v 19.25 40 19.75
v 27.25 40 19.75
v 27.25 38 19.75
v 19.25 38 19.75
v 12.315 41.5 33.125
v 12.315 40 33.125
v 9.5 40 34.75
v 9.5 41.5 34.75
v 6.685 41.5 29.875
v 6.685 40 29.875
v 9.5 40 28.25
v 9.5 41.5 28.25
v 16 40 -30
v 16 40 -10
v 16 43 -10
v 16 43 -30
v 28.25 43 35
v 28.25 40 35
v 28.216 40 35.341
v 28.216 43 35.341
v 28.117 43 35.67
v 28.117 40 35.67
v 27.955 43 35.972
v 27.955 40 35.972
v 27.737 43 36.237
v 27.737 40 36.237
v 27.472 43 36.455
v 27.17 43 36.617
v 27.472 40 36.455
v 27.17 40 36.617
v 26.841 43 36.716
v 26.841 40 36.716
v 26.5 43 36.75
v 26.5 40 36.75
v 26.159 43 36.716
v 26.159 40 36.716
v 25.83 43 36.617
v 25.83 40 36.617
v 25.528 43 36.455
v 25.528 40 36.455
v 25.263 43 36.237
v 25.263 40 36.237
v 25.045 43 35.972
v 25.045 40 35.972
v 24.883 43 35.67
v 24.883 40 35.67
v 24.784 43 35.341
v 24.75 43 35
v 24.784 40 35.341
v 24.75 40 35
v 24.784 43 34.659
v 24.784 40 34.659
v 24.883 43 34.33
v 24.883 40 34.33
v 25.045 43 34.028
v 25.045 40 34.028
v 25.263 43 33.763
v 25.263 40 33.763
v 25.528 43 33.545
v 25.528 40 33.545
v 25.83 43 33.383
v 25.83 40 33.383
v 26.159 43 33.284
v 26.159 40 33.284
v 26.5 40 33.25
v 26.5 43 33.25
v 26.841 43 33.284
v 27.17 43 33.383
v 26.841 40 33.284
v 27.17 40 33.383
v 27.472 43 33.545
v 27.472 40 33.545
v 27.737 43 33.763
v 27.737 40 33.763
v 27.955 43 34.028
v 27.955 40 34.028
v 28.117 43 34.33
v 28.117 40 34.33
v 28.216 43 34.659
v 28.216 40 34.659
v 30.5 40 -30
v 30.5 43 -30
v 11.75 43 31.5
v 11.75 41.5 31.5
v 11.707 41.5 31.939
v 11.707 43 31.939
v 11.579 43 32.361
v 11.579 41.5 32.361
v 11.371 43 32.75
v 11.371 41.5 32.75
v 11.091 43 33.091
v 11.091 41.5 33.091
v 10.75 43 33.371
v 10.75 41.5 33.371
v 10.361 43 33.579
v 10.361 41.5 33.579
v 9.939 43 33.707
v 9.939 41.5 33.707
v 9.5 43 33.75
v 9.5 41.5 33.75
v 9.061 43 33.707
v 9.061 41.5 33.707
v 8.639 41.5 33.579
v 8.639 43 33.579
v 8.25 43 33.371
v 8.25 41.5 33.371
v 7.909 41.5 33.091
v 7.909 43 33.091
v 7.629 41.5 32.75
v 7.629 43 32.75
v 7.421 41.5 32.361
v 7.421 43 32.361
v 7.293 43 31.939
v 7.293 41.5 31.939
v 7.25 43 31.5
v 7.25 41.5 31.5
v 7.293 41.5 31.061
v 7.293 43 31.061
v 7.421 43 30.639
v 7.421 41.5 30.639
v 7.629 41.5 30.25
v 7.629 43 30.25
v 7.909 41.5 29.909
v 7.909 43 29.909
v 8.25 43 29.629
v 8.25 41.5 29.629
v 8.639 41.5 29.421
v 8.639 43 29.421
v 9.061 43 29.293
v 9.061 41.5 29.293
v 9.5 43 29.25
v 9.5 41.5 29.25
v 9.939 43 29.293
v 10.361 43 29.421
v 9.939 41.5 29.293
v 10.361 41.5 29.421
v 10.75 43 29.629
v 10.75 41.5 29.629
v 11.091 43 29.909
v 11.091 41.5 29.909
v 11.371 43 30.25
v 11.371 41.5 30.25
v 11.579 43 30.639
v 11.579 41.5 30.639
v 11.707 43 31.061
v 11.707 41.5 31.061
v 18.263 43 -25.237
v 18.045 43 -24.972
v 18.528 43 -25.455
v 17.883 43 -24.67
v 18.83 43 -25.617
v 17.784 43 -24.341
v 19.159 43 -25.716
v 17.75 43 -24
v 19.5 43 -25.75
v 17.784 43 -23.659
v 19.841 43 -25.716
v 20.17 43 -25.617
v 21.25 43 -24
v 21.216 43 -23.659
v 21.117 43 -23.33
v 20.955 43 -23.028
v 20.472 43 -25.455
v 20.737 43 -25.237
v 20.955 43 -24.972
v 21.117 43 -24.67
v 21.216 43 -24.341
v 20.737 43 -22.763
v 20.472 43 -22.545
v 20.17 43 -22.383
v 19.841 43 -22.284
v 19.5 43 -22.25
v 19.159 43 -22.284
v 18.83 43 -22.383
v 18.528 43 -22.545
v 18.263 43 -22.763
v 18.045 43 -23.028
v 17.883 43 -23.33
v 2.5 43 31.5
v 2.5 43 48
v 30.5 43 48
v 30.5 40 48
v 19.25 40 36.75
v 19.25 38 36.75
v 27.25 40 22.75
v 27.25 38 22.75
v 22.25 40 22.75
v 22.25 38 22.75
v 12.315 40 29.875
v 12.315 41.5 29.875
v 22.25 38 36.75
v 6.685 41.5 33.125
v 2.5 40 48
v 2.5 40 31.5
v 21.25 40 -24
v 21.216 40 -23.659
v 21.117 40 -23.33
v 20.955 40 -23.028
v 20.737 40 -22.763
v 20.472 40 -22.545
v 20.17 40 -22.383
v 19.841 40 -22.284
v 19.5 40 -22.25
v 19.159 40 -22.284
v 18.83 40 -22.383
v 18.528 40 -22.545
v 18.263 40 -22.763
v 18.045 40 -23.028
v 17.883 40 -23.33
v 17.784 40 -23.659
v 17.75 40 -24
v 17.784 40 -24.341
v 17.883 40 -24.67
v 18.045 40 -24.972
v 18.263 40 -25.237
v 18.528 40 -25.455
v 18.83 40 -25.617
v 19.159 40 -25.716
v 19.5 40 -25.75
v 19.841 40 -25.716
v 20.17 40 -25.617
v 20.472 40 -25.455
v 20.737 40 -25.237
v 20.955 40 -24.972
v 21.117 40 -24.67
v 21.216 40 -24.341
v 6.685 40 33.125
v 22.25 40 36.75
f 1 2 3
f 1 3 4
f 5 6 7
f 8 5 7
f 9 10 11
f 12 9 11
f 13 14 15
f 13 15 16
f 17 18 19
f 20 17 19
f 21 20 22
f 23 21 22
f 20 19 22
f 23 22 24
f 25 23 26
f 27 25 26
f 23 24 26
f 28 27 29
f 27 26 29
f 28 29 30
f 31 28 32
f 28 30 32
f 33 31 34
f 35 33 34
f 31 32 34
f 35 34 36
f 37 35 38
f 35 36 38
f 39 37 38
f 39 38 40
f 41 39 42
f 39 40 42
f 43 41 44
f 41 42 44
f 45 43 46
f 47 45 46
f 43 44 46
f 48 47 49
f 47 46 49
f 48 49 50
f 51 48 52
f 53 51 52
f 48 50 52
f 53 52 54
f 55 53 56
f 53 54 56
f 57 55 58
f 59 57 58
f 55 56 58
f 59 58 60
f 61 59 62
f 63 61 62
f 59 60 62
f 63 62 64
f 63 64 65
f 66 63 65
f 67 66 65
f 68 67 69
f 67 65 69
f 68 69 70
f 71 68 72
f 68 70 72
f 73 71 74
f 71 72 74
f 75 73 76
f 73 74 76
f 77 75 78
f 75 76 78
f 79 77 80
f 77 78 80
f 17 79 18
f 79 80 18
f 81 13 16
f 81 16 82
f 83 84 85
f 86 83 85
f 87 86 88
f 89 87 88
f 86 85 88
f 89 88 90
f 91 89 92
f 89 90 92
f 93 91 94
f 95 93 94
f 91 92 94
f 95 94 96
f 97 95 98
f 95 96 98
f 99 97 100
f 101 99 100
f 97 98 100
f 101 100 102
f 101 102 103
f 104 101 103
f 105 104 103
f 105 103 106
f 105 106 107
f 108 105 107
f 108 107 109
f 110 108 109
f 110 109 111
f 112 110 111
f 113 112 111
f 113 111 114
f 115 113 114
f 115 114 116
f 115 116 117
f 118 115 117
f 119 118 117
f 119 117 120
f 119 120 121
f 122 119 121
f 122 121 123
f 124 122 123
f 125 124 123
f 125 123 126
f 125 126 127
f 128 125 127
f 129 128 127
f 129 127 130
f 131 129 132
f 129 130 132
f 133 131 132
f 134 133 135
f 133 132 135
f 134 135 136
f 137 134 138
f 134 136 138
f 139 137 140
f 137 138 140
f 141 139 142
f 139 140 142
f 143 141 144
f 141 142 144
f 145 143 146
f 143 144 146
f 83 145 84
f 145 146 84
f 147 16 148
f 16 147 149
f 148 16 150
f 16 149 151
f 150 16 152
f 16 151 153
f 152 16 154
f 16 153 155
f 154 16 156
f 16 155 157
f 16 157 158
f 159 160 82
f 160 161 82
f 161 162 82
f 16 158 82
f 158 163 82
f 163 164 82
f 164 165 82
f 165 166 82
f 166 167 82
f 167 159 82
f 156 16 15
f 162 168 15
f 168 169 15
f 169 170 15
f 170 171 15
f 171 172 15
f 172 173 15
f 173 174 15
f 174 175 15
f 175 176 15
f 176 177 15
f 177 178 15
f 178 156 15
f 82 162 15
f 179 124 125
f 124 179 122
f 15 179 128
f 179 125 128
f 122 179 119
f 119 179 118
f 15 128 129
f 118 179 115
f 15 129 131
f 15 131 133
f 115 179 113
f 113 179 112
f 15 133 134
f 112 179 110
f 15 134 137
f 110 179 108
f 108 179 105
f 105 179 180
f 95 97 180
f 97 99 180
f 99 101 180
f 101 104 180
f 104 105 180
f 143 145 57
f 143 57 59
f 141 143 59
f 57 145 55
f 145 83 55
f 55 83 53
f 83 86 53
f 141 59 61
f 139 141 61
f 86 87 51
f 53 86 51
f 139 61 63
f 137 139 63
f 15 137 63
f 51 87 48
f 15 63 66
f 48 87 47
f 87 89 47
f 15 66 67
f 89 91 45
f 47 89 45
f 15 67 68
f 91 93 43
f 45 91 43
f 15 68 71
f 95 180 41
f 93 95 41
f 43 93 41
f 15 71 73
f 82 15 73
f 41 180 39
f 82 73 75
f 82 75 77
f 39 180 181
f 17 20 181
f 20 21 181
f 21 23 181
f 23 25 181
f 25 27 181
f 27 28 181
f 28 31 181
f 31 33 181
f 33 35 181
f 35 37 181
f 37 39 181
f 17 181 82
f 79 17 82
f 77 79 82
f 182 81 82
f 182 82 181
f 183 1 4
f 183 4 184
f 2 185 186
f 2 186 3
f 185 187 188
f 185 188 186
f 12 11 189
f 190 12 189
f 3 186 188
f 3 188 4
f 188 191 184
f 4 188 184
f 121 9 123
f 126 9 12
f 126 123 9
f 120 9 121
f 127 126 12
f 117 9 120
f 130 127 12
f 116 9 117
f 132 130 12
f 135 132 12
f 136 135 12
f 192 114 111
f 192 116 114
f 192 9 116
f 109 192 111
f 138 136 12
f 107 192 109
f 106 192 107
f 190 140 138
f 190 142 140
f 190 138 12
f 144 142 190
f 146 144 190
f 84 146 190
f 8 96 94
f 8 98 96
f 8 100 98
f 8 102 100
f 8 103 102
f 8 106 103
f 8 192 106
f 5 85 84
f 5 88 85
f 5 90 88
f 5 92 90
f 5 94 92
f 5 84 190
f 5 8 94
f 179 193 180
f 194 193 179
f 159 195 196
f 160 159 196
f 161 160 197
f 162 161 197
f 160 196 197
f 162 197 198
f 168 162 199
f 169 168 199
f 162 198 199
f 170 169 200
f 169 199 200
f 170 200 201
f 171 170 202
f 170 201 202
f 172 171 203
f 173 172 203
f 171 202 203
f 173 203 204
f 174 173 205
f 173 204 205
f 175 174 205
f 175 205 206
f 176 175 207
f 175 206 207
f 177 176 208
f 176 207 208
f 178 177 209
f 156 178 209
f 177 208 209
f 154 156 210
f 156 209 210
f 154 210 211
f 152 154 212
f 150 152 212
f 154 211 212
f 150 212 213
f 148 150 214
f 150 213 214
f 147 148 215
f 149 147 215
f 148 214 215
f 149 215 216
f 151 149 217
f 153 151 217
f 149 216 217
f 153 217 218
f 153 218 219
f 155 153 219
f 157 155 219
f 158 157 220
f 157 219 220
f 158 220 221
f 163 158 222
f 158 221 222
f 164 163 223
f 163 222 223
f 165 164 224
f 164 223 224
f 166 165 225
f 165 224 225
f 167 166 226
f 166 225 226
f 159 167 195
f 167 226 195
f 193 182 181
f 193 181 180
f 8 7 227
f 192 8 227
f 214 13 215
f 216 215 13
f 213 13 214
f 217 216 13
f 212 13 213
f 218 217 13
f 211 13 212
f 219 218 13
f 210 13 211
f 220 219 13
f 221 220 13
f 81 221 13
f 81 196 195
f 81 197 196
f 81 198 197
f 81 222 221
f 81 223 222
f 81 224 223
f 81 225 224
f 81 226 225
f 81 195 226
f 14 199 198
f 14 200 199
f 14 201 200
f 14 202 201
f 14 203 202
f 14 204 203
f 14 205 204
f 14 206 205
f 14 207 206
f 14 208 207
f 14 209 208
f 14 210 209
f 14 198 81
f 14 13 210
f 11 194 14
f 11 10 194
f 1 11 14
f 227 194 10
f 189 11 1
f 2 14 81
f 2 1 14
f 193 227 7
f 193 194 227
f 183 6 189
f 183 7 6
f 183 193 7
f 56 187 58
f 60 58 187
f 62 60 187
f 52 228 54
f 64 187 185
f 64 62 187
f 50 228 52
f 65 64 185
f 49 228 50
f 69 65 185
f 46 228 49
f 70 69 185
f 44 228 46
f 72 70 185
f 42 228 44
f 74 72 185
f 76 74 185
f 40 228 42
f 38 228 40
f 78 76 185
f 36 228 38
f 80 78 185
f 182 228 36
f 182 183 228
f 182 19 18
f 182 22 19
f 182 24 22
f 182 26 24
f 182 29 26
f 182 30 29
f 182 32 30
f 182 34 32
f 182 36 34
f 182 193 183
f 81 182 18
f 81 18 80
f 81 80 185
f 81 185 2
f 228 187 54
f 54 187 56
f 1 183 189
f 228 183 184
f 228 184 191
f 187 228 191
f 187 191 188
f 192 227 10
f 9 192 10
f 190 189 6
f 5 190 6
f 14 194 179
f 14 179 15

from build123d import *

# Parameters (mm, degrees)
SKETCH022_R     = 1.75
SKETCH022_R_2   = 2.25
PAD009_DEPTH    = 3
POCKET019_DEPTH = 1.5
PAD014_DEPTH    = 2


with BuildPart() as part:
    # Sketch022 → Pad009 (new body)
    with BuildSketch(Plane.XZ):
        Polygon((30.5, 48), (2.5, 48), (2.5, 31.5), (16, -10), (16, -30), (30.5, -30), align=None)
        with Locations((19.5, -24)):
            Circle(SKETCH022_R, mode=Mode.SUBTRACT)
        with Locations((9.5, 31.5)):
            Circle(SKETCH022_R_2, mode=Mode.SUBTRACT)
        with Locations((26.5, 35)):
            Circle(SKETCH022_R, mode=Mode.SUBTRACT)
    extrude(amount=-PAD009_DEPTH)

    # Sketch036 → Pocket019 (cut)
    with BuildSketch(Plane.XZ):
        Polygon((12.3145825623, 29.875), (12.3145825623, 33.125), (9.5, 34.75), (6.6854174377, 33.125), (6.6854174377, 29.875), (9.5, 28.25), align=None)
    extrude(amount=-POCKET019_DEPTH, mode=Mode.SUBTRACT)

    # Sketch039 → Pad014 (join)
    with BuildSketch(Plane.XZ):
        Polygon((22.25, 36.75), (22.25, 22.75), (27.25, 22.75), (27.25, 19.75), (19.25, 19.75), (19.25, 36.75), align=None)
    extrude(amount=PAD014_DEPTH)


with BuildPart() as part_1:
    # Body004 placement: moved
    add(part.part.moved(Location((0, 40, 0))))


solid = part_1.part
